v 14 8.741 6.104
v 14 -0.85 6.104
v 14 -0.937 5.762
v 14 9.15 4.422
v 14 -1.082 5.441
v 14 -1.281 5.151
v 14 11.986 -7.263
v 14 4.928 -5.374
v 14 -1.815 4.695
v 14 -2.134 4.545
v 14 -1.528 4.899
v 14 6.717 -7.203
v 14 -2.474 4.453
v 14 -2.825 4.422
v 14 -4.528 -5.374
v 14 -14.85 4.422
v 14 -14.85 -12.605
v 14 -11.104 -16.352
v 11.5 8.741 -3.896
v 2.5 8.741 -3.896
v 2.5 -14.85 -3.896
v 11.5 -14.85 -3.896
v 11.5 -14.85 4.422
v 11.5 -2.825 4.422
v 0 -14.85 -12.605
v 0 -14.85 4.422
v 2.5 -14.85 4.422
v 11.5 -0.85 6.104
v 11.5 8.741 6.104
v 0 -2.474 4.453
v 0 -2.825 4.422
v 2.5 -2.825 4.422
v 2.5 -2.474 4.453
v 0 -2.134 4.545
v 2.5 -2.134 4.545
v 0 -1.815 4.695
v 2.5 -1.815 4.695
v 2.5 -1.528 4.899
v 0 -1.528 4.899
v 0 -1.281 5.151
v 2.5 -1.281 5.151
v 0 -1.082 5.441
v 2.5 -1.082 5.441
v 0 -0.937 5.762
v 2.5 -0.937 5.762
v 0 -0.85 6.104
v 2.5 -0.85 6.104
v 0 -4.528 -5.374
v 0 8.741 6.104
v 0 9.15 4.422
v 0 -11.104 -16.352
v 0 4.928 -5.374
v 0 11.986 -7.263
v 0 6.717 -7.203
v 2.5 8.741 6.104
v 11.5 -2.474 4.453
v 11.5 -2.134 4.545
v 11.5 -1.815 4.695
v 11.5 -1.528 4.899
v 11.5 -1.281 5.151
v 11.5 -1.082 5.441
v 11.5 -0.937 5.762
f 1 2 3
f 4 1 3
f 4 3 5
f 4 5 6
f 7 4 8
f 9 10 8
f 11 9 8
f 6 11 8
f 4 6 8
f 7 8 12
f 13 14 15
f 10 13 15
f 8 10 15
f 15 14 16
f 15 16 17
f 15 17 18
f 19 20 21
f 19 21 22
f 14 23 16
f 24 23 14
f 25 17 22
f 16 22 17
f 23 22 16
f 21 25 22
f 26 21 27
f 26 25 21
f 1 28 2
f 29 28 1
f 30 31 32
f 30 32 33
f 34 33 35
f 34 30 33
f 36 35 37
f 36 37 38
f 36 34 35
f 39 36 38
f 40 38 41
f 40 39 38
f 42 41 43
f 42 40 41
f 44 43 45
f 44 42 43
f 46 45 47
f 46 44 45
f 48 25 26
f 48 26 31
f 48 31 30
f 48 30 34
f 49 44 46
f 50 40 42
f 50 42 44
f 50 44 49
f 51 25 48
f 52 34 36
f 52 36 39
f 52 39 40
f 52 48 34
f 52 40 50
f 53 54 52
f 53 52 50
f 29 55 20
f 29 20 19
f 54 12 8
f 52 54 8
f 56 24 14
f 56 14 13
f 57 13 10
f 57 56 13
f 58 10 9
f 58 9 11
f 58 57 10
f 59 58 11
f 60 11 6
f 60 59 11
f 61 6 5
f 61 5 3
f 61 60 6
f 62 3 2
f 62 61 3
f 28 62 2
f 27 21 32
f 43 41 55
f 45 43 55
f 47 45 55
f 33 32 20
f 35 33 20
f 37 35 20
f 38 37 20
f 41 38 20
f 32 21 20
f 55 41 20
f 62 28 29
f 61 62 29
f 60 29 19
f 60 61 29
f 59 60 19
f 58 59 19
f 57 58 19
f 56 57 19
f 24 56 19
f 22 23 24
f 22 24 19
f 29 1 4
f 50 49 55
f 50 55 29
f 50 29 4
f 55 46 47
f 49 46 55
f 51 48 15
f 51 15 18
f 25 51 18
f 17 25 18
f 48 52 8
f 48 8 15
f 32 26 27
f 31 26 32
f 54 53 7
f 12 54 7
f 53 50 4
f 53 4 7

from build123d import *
from OCP.BRepFilletAPI import BRepFilletAPI_MakeChamfer

# Parameters (mm, degrees)
BOSS_EXTRUDE5_DEPTH = 14
SKETCH6_W           = 9
SKETCH6_H           = 23.591652045
CUT_EXTRUDE1_DEPTH  = 10
FILLET1_R           = 2
CHAMFER1_SIZE       = 10
CHAMFER1_SIZE2      = 7.296849953
CHAMFER1_SIZE2_2    = 7.289947028


with BuildPart() as part:
    # Sketch4 → Boss-Extrude5 (new body)
    with BuildSketch(Plane(origin=(0, 0, 0), x_dir=(0, 0, -1), z_dir=(1, 0, 0))):
        Polygon((-4.421768707, 9.149659864), (14.353741497, 13.707482993), (5.37414966, 4.927966044), (5.37414966, -4.527816269), (22.605249741, -14.850340136), (-4.421768707, -14.850340136), (-4.421768707, -0.850340136), (-6.10391849, -0.850340136), (-6.10391849, 8.741311909), align=None)
    extrude(amount=BOSS_EXTRUDE5_DEPTH)

    # Sketch6 → Cut-Extrude1 (cut)
    with BuildSketch(Plane.XY.offset(6.10391849)):
        with Locations((7, -3.054514114)):
            Rectangle(SKETCH6_W, SKETCH6_H)
    extrude(amount=-CUT_EXTRUDE1_DEPTH, mode=Mode.SUBTRACT)

    # Fillet1
    # the kernel refuses this fillet: 2 mm, written as the material it adds along each edge
    with BuildSketch(Plane(origin=(0, -0.850340136, 4.421768707), x_dir=(0, -1, 0), z_dir=(1, 0, 0))) as fillet1_piece_1:
        with BuildLine():
            CenterArc((1.974581282, -2), FILLET1_R, 90, 80.855488808)
            Line((0, -1.682149783), (-0.039491626, -1.675792779))
            ThreePointArc((-0.039491626, -1.675792779), (-0.04, -0.841074891), (-0.04, 0))
            Line((-0.04, 0), (0, 0.04))
            Line((0, 0.04), (1.974581282, 0.04))
            Line((1.974581282, 0.04), (1.974581282, 0))
        make_face()
    extrude(amount=2.5)
    with BuildSketch(Plane(origin=(11.5, -0.850340136, 4.421768707), x_dir=(0, 0, 1), z_dir=(1, 0, 0))) as fillet1_piece_2:
        with BuildLine():
            CenterArc((2, 1.974581282), FILLET1_R, 180, 80.855488808)
            Line((0, 1.974581282), (-0.04, 1.974581282))
            Line((-0.04, 1.974581282), (-0.04, 0))
            Line((-0.04, 0), (0, -0.04))
            ThreePointArc((0, -0.04), (0.841074891, -0.04), (1.675792779, -0.039491626))
            Line((1.675792779, -0.039491626), (1.682149783, 0))
        make_face()
    extrude(amount=2.5)

    # Chamfer1: one chamfer whose edges measure the first distance from different faces: ONE call of the kernel's chamfer builder (chamfer() names one face for all edges)
    chamfer1_edges_1 = [part.edges().sort_by_distance(p)[0] for p in [
        (7, 13.707482993, -14.353741497),
    ]]
    chamfer1_side_1 = [part.faces().sort_by_distance(p)[0] for p in [
        (7, 9.317724519, -9.863945578),
    ]]
    chamfer1_edges_2 = [part.edges().sort_by_distance(p)[0] for p in [
        (7, -14.850340136, -22.605249741),
    ]]
    chamfer1_side_2 = [part.faces().sort_by_distance(p)[0] for p in [
        (7, -14.850340136, -11.398988107),
    ]]
    chamfer1 = BRepFilletAPI_MakeChamfer(part.part.solid().wrapped)
    for e in chamfer1_edges_1:
        chamfer1.Add(CHAMFER1_SIZE, CHAMFER1_SIZE2, e.wrapped, chamfer1_side_1[0].wrapped)  # the first distance lies on this face
    for e in chamfer1_edges_2:
        chamfer1.Add(CHAMFER1_SIZE, CHAMFER1_SIZE2_2, e.wrapped, chamfer1_side_2[0].wrapped)  # the first distance lies on this face
    add(Compound.cast(chamfer1.Shape()), mode=Mode.REPLACE)


solid = part.part
